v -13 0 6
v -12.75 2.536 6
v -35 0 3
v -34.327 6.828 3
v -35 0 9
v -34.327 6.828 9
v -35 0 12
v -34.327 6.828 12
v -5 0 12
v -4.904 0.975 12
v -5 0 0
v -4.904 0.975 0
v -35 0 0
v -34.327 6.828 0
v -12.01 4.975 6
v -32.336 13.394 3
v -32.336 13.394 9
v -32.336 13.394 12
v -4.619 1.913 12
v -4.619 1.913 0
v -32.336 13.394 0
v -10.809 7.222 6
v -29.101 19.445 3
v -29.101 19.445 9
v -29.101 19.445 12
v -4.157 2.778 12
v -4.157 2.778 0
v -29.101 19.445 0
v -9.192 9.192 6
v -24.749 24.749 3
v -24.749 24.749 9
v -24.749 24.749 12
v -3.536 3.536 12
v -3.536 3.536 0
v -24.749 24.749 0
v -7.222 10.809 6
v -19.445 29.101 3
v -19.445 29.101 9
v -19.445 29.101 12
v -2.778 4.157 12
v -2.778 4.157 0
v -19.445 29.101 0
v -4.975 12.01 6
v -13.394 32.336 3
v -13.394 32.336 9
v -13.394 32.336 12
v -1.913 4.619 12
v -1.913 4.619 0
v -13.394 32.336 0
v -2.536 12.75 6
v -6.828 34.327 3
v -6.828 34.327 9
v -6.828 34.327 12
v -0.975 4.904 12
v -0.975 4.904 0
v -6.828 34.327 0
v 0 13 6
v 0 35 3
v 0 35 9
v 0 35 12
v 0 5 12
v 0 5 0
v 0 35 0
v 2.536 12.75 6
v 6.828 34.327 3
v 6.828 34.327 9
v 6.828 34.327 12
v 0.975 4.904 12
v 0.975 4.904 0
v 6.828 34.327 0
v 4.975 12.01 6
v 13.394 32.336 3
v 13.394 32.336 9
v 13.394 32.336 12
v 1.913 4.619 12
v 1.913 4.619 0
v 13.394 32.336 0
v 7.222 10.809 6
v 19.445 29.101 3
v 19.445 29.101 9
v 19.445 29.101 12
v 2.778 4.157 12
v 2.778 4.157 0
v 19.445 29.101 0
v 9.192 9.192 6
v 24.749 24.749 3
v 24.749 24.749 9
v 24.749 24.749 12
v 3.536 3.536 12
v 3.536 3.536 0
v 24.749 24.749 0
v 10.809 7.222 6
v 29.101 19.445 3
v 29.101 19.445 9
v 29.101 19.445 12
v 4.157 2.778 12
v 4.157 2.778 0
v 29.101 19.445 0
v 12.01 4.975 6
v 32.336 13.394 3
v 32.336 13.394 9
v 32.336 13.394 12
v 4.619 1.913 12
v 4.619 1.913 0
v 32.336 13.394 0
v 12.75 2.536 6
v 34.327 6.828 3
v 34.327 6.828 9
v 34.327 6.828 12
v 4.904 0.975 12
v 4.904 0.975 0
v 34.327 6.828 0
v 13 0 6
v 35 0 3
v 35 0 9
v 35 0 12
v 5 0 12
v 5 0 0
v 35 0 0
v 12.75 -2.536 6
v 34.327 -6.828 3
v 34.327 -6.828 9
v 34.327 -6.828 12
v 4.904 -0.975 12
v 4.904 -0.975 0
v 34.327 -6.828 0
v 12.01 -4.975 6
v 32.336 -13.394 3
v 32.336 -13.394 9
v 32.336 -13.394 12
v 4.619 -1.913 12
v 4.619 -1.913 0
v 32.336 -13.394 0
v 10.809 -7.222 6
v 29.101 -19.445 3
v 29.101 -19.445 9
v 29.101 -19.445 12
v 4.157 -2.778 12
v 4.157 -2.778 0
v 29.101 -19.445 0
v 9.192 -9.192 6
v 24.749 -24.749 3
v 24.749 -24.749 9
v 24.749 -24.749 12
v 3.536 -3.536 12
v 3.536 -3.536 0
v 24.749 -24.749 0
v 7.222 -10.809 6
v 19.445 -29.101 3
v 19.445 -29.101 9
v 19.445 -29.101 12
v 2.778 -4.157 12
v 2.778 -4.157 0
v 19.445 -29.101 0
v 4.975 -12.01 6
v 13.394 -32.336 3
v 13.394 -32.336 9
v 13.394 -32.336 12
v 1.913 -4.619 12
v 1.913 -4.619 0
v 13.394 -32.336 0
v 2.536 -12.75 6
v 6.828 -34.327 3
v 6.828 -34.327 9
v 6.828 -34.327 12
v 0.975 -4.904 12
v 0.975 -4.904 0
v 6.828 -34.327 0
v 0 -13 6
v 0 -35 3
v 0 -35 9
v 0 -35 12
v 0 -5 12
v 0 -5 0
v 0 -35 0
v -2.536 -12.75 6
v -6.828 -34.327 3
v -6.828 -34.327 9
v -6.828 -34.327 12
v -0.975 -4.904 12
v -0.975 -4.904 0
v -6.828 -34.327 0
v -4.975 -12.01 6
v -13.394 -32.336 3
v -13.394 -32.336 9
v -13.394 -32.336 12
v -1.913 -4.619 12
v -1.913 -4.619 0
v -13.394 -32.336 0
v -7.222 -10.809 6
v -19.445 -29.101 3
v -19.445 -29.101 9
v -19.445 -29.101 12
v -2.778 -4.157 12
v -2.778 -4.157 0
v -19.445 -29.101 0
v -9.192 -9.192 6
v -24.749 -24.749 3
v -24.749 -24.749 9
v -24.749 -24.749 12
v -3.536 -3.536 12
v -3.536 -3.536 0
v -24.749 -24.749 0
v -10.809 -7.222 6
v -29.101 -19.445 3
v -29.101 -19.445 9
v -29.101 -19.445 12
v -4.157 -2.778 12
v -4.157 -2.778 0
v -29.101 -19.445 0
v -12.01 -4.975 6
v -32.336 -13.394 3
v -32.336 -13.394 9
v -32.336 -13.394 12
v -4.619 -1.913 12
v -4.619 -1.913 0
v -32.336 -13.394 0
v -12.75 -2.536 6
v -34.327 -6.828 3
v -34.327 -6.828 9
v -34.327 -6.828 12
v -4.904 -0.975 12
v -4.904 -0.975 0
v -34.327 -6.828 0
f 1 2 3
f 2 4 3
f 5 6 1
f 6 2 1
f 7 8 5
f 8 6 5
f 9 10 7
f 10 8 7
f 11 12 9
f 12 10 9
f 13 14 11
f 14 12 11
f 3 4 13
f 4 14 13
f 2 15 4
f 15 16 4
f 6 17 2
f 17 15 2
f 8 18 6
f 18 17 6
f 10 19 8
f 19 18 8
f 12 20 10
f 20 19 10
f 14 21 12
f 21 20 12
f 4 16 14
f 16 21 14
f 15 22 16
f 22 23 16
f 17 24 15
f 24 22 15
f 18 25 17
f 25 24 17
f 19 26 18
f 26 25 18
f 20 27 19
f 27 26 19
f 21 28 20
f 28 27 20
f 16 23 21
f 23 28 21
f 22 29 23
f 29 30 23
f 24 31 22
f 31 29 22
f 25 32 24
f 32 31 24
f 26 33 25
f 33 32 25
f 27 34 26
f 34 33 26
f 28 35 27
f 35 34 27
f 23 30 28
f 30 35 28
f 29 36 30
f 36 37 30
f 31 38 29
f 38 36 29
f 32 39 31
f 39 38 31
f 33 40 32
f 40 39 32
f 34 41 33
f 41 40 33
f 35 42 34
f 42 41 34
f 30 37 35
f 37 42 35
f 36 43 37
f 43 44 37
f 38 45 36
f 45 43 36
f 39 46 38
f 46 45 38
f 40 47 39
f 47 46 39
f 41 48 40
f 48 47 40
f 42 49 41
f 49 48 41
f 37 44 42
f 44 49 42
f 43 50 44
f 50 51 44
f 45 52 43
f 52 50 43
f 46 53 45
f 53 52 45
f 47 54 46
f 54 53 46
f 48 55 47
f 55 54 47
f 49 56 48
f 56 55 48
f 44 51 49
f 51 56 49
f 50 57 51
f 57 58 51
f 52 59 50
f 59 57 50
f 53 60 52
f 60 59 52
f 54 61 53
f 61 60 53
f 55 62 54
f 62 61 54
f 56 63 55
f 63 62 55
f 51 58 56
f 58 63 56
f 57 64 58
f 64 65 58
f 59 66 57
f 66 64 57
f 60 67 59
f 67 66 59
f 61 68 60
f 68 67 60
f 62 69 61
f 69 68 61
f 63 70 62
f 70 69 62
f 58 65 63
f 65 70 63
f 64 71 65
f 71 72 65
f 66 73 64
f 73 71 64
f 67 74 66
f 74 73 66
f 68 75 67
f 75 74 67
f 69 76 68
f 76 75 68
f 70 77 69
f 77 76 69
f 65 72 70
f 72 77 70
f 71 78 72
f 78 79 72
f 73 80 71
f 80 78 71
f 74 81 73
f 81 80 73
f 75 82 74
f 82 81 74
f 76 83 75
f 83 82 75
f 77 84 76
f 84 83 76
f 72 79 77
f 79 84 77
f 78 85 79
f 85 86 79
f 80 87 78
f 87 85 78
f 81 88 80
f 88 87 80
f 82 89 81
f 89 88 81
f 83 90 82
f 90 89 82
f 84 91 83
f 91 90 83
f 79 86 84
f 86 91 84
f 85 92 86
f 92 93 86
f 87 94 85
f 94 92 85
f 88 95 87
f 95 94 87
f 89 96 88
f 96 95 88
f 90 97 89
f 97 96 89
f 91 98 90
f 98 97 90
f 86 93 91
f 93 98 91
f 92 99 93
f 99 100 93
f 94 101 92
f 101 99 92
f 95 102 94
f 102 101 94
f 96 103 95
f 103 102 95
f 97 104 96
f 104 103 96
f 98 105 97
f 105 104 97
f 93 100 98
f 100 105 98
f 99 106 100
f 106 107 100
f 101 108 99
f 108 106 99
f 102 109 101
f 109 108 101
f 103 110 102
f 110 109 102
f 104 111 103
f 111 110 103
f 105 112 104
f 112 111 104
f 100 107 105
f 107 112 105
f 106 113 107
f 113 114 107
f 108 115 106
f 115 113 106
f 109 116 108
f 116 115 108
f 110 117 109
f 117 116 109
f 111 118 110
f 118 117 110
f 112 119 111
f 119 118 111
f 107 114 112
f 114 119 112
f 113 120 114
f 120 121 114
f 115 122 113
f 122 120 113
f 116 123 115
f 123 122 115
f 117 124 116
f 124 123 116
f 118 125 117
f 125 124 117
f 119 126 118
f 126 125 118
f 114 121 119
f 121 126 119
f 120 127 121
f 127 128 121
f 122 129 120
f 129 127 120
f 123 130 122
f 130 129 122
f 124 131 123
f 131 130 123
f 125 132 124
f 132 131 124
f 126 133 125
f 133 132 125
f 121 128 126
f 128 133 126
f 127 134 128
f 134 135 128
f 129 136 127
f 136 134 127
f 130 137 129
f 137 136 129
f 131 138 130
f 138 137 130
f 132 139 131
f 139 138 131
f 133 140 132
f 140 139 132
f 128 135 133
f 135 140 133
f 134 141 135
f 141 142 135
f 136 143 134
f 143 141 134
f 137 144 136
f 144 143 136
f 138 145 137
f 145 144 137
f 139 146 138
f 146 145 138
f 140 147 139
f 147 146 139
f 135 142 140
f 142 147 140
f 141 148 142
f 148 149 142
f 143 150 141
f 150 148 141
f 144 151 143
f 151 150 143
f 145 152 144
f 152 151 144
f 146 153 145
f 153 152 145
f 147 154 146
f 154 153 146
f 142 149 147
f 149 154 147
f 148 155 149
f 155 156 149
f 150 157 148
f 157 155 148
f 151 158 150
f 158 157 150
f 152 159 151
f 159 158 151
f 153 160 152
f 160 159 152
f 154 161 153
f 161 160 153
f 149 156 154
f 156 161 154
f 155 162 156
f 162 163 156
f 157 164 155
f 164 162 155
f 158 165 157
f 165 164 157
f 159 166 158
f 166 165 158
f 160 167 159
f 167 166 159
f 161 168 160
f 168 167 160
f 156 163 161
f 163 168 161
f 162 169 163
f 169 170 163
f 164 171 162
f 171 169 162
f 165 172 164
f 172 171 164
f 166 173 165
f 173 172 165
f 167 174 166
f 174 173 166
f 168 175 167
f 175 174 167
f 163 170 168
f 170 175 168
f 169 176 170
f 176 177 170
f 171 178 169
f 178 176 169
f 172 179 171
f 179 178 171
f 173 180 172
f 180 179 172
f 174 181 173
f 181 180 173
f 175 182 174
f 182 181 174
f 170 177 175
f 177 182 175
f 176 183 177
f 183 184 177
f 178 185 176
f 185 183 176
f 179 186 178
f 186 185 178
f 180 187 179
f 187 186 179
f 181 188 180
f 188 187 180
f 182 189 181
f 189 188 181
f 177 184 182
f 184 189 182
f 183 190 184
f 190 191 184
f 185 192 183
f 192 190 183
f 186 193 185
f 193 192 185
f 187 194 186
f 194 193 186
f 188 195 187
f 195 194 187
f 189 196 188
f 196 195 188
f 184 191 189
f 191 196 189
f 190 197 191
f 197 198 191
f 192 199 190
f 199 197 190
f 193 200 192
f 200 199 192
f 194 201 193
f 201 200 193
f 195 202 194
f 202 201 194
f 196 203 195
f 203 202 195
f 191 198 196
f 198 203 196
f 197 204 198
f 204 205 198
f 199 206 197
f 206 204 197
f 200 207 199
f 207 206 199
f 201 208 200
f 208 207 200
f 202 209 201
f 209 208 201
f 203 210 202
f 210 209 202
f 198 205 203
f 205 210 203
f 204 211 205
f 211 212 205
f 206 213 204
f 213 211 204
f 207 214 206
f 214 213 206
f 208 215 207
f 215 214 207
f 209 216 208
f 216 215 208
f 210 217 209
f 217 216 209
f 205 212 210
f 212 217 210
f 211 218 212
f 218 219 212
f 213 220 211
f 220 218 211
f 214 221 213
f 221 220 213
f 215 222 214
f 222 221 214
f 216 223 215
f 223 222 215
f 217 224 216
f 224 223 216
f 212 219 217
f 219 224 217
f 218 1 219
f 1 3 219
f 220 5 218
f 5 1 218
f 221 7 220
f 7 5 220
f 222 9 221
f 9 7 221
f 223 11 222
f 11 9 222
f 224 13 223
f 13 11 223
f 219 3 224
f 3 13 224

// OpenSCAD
$fn = 32;

// ----------------------------------------------------------------------
// Revolved part: V-groove pulley R35
// ----------------------------------------------------------------------

// --- parameters (mm) ---
bore_r = 5;               // bore radius
rim_r = 35;               // rim radius
rim_t = 12;               // rim width
groove_r = 13;            // groove root radius
groove_w = 3;             // groove half width
revolve_angle = 360;      // revolve sweep, degrees

bore_d = 2 * bore_r;
rim_d = 2 * rim_r;
groove_d = 2 * groove_r;

profile = [[5, 0], [35, 0], [35, 3], [13, 6], [35, 9], [35, 12], [5, 12]];  // primary outline, 7 points, counter clockwise

// --- the one profile operation ---
rotate_extrude(angle = revolve_angle) polygon(points = profile);
